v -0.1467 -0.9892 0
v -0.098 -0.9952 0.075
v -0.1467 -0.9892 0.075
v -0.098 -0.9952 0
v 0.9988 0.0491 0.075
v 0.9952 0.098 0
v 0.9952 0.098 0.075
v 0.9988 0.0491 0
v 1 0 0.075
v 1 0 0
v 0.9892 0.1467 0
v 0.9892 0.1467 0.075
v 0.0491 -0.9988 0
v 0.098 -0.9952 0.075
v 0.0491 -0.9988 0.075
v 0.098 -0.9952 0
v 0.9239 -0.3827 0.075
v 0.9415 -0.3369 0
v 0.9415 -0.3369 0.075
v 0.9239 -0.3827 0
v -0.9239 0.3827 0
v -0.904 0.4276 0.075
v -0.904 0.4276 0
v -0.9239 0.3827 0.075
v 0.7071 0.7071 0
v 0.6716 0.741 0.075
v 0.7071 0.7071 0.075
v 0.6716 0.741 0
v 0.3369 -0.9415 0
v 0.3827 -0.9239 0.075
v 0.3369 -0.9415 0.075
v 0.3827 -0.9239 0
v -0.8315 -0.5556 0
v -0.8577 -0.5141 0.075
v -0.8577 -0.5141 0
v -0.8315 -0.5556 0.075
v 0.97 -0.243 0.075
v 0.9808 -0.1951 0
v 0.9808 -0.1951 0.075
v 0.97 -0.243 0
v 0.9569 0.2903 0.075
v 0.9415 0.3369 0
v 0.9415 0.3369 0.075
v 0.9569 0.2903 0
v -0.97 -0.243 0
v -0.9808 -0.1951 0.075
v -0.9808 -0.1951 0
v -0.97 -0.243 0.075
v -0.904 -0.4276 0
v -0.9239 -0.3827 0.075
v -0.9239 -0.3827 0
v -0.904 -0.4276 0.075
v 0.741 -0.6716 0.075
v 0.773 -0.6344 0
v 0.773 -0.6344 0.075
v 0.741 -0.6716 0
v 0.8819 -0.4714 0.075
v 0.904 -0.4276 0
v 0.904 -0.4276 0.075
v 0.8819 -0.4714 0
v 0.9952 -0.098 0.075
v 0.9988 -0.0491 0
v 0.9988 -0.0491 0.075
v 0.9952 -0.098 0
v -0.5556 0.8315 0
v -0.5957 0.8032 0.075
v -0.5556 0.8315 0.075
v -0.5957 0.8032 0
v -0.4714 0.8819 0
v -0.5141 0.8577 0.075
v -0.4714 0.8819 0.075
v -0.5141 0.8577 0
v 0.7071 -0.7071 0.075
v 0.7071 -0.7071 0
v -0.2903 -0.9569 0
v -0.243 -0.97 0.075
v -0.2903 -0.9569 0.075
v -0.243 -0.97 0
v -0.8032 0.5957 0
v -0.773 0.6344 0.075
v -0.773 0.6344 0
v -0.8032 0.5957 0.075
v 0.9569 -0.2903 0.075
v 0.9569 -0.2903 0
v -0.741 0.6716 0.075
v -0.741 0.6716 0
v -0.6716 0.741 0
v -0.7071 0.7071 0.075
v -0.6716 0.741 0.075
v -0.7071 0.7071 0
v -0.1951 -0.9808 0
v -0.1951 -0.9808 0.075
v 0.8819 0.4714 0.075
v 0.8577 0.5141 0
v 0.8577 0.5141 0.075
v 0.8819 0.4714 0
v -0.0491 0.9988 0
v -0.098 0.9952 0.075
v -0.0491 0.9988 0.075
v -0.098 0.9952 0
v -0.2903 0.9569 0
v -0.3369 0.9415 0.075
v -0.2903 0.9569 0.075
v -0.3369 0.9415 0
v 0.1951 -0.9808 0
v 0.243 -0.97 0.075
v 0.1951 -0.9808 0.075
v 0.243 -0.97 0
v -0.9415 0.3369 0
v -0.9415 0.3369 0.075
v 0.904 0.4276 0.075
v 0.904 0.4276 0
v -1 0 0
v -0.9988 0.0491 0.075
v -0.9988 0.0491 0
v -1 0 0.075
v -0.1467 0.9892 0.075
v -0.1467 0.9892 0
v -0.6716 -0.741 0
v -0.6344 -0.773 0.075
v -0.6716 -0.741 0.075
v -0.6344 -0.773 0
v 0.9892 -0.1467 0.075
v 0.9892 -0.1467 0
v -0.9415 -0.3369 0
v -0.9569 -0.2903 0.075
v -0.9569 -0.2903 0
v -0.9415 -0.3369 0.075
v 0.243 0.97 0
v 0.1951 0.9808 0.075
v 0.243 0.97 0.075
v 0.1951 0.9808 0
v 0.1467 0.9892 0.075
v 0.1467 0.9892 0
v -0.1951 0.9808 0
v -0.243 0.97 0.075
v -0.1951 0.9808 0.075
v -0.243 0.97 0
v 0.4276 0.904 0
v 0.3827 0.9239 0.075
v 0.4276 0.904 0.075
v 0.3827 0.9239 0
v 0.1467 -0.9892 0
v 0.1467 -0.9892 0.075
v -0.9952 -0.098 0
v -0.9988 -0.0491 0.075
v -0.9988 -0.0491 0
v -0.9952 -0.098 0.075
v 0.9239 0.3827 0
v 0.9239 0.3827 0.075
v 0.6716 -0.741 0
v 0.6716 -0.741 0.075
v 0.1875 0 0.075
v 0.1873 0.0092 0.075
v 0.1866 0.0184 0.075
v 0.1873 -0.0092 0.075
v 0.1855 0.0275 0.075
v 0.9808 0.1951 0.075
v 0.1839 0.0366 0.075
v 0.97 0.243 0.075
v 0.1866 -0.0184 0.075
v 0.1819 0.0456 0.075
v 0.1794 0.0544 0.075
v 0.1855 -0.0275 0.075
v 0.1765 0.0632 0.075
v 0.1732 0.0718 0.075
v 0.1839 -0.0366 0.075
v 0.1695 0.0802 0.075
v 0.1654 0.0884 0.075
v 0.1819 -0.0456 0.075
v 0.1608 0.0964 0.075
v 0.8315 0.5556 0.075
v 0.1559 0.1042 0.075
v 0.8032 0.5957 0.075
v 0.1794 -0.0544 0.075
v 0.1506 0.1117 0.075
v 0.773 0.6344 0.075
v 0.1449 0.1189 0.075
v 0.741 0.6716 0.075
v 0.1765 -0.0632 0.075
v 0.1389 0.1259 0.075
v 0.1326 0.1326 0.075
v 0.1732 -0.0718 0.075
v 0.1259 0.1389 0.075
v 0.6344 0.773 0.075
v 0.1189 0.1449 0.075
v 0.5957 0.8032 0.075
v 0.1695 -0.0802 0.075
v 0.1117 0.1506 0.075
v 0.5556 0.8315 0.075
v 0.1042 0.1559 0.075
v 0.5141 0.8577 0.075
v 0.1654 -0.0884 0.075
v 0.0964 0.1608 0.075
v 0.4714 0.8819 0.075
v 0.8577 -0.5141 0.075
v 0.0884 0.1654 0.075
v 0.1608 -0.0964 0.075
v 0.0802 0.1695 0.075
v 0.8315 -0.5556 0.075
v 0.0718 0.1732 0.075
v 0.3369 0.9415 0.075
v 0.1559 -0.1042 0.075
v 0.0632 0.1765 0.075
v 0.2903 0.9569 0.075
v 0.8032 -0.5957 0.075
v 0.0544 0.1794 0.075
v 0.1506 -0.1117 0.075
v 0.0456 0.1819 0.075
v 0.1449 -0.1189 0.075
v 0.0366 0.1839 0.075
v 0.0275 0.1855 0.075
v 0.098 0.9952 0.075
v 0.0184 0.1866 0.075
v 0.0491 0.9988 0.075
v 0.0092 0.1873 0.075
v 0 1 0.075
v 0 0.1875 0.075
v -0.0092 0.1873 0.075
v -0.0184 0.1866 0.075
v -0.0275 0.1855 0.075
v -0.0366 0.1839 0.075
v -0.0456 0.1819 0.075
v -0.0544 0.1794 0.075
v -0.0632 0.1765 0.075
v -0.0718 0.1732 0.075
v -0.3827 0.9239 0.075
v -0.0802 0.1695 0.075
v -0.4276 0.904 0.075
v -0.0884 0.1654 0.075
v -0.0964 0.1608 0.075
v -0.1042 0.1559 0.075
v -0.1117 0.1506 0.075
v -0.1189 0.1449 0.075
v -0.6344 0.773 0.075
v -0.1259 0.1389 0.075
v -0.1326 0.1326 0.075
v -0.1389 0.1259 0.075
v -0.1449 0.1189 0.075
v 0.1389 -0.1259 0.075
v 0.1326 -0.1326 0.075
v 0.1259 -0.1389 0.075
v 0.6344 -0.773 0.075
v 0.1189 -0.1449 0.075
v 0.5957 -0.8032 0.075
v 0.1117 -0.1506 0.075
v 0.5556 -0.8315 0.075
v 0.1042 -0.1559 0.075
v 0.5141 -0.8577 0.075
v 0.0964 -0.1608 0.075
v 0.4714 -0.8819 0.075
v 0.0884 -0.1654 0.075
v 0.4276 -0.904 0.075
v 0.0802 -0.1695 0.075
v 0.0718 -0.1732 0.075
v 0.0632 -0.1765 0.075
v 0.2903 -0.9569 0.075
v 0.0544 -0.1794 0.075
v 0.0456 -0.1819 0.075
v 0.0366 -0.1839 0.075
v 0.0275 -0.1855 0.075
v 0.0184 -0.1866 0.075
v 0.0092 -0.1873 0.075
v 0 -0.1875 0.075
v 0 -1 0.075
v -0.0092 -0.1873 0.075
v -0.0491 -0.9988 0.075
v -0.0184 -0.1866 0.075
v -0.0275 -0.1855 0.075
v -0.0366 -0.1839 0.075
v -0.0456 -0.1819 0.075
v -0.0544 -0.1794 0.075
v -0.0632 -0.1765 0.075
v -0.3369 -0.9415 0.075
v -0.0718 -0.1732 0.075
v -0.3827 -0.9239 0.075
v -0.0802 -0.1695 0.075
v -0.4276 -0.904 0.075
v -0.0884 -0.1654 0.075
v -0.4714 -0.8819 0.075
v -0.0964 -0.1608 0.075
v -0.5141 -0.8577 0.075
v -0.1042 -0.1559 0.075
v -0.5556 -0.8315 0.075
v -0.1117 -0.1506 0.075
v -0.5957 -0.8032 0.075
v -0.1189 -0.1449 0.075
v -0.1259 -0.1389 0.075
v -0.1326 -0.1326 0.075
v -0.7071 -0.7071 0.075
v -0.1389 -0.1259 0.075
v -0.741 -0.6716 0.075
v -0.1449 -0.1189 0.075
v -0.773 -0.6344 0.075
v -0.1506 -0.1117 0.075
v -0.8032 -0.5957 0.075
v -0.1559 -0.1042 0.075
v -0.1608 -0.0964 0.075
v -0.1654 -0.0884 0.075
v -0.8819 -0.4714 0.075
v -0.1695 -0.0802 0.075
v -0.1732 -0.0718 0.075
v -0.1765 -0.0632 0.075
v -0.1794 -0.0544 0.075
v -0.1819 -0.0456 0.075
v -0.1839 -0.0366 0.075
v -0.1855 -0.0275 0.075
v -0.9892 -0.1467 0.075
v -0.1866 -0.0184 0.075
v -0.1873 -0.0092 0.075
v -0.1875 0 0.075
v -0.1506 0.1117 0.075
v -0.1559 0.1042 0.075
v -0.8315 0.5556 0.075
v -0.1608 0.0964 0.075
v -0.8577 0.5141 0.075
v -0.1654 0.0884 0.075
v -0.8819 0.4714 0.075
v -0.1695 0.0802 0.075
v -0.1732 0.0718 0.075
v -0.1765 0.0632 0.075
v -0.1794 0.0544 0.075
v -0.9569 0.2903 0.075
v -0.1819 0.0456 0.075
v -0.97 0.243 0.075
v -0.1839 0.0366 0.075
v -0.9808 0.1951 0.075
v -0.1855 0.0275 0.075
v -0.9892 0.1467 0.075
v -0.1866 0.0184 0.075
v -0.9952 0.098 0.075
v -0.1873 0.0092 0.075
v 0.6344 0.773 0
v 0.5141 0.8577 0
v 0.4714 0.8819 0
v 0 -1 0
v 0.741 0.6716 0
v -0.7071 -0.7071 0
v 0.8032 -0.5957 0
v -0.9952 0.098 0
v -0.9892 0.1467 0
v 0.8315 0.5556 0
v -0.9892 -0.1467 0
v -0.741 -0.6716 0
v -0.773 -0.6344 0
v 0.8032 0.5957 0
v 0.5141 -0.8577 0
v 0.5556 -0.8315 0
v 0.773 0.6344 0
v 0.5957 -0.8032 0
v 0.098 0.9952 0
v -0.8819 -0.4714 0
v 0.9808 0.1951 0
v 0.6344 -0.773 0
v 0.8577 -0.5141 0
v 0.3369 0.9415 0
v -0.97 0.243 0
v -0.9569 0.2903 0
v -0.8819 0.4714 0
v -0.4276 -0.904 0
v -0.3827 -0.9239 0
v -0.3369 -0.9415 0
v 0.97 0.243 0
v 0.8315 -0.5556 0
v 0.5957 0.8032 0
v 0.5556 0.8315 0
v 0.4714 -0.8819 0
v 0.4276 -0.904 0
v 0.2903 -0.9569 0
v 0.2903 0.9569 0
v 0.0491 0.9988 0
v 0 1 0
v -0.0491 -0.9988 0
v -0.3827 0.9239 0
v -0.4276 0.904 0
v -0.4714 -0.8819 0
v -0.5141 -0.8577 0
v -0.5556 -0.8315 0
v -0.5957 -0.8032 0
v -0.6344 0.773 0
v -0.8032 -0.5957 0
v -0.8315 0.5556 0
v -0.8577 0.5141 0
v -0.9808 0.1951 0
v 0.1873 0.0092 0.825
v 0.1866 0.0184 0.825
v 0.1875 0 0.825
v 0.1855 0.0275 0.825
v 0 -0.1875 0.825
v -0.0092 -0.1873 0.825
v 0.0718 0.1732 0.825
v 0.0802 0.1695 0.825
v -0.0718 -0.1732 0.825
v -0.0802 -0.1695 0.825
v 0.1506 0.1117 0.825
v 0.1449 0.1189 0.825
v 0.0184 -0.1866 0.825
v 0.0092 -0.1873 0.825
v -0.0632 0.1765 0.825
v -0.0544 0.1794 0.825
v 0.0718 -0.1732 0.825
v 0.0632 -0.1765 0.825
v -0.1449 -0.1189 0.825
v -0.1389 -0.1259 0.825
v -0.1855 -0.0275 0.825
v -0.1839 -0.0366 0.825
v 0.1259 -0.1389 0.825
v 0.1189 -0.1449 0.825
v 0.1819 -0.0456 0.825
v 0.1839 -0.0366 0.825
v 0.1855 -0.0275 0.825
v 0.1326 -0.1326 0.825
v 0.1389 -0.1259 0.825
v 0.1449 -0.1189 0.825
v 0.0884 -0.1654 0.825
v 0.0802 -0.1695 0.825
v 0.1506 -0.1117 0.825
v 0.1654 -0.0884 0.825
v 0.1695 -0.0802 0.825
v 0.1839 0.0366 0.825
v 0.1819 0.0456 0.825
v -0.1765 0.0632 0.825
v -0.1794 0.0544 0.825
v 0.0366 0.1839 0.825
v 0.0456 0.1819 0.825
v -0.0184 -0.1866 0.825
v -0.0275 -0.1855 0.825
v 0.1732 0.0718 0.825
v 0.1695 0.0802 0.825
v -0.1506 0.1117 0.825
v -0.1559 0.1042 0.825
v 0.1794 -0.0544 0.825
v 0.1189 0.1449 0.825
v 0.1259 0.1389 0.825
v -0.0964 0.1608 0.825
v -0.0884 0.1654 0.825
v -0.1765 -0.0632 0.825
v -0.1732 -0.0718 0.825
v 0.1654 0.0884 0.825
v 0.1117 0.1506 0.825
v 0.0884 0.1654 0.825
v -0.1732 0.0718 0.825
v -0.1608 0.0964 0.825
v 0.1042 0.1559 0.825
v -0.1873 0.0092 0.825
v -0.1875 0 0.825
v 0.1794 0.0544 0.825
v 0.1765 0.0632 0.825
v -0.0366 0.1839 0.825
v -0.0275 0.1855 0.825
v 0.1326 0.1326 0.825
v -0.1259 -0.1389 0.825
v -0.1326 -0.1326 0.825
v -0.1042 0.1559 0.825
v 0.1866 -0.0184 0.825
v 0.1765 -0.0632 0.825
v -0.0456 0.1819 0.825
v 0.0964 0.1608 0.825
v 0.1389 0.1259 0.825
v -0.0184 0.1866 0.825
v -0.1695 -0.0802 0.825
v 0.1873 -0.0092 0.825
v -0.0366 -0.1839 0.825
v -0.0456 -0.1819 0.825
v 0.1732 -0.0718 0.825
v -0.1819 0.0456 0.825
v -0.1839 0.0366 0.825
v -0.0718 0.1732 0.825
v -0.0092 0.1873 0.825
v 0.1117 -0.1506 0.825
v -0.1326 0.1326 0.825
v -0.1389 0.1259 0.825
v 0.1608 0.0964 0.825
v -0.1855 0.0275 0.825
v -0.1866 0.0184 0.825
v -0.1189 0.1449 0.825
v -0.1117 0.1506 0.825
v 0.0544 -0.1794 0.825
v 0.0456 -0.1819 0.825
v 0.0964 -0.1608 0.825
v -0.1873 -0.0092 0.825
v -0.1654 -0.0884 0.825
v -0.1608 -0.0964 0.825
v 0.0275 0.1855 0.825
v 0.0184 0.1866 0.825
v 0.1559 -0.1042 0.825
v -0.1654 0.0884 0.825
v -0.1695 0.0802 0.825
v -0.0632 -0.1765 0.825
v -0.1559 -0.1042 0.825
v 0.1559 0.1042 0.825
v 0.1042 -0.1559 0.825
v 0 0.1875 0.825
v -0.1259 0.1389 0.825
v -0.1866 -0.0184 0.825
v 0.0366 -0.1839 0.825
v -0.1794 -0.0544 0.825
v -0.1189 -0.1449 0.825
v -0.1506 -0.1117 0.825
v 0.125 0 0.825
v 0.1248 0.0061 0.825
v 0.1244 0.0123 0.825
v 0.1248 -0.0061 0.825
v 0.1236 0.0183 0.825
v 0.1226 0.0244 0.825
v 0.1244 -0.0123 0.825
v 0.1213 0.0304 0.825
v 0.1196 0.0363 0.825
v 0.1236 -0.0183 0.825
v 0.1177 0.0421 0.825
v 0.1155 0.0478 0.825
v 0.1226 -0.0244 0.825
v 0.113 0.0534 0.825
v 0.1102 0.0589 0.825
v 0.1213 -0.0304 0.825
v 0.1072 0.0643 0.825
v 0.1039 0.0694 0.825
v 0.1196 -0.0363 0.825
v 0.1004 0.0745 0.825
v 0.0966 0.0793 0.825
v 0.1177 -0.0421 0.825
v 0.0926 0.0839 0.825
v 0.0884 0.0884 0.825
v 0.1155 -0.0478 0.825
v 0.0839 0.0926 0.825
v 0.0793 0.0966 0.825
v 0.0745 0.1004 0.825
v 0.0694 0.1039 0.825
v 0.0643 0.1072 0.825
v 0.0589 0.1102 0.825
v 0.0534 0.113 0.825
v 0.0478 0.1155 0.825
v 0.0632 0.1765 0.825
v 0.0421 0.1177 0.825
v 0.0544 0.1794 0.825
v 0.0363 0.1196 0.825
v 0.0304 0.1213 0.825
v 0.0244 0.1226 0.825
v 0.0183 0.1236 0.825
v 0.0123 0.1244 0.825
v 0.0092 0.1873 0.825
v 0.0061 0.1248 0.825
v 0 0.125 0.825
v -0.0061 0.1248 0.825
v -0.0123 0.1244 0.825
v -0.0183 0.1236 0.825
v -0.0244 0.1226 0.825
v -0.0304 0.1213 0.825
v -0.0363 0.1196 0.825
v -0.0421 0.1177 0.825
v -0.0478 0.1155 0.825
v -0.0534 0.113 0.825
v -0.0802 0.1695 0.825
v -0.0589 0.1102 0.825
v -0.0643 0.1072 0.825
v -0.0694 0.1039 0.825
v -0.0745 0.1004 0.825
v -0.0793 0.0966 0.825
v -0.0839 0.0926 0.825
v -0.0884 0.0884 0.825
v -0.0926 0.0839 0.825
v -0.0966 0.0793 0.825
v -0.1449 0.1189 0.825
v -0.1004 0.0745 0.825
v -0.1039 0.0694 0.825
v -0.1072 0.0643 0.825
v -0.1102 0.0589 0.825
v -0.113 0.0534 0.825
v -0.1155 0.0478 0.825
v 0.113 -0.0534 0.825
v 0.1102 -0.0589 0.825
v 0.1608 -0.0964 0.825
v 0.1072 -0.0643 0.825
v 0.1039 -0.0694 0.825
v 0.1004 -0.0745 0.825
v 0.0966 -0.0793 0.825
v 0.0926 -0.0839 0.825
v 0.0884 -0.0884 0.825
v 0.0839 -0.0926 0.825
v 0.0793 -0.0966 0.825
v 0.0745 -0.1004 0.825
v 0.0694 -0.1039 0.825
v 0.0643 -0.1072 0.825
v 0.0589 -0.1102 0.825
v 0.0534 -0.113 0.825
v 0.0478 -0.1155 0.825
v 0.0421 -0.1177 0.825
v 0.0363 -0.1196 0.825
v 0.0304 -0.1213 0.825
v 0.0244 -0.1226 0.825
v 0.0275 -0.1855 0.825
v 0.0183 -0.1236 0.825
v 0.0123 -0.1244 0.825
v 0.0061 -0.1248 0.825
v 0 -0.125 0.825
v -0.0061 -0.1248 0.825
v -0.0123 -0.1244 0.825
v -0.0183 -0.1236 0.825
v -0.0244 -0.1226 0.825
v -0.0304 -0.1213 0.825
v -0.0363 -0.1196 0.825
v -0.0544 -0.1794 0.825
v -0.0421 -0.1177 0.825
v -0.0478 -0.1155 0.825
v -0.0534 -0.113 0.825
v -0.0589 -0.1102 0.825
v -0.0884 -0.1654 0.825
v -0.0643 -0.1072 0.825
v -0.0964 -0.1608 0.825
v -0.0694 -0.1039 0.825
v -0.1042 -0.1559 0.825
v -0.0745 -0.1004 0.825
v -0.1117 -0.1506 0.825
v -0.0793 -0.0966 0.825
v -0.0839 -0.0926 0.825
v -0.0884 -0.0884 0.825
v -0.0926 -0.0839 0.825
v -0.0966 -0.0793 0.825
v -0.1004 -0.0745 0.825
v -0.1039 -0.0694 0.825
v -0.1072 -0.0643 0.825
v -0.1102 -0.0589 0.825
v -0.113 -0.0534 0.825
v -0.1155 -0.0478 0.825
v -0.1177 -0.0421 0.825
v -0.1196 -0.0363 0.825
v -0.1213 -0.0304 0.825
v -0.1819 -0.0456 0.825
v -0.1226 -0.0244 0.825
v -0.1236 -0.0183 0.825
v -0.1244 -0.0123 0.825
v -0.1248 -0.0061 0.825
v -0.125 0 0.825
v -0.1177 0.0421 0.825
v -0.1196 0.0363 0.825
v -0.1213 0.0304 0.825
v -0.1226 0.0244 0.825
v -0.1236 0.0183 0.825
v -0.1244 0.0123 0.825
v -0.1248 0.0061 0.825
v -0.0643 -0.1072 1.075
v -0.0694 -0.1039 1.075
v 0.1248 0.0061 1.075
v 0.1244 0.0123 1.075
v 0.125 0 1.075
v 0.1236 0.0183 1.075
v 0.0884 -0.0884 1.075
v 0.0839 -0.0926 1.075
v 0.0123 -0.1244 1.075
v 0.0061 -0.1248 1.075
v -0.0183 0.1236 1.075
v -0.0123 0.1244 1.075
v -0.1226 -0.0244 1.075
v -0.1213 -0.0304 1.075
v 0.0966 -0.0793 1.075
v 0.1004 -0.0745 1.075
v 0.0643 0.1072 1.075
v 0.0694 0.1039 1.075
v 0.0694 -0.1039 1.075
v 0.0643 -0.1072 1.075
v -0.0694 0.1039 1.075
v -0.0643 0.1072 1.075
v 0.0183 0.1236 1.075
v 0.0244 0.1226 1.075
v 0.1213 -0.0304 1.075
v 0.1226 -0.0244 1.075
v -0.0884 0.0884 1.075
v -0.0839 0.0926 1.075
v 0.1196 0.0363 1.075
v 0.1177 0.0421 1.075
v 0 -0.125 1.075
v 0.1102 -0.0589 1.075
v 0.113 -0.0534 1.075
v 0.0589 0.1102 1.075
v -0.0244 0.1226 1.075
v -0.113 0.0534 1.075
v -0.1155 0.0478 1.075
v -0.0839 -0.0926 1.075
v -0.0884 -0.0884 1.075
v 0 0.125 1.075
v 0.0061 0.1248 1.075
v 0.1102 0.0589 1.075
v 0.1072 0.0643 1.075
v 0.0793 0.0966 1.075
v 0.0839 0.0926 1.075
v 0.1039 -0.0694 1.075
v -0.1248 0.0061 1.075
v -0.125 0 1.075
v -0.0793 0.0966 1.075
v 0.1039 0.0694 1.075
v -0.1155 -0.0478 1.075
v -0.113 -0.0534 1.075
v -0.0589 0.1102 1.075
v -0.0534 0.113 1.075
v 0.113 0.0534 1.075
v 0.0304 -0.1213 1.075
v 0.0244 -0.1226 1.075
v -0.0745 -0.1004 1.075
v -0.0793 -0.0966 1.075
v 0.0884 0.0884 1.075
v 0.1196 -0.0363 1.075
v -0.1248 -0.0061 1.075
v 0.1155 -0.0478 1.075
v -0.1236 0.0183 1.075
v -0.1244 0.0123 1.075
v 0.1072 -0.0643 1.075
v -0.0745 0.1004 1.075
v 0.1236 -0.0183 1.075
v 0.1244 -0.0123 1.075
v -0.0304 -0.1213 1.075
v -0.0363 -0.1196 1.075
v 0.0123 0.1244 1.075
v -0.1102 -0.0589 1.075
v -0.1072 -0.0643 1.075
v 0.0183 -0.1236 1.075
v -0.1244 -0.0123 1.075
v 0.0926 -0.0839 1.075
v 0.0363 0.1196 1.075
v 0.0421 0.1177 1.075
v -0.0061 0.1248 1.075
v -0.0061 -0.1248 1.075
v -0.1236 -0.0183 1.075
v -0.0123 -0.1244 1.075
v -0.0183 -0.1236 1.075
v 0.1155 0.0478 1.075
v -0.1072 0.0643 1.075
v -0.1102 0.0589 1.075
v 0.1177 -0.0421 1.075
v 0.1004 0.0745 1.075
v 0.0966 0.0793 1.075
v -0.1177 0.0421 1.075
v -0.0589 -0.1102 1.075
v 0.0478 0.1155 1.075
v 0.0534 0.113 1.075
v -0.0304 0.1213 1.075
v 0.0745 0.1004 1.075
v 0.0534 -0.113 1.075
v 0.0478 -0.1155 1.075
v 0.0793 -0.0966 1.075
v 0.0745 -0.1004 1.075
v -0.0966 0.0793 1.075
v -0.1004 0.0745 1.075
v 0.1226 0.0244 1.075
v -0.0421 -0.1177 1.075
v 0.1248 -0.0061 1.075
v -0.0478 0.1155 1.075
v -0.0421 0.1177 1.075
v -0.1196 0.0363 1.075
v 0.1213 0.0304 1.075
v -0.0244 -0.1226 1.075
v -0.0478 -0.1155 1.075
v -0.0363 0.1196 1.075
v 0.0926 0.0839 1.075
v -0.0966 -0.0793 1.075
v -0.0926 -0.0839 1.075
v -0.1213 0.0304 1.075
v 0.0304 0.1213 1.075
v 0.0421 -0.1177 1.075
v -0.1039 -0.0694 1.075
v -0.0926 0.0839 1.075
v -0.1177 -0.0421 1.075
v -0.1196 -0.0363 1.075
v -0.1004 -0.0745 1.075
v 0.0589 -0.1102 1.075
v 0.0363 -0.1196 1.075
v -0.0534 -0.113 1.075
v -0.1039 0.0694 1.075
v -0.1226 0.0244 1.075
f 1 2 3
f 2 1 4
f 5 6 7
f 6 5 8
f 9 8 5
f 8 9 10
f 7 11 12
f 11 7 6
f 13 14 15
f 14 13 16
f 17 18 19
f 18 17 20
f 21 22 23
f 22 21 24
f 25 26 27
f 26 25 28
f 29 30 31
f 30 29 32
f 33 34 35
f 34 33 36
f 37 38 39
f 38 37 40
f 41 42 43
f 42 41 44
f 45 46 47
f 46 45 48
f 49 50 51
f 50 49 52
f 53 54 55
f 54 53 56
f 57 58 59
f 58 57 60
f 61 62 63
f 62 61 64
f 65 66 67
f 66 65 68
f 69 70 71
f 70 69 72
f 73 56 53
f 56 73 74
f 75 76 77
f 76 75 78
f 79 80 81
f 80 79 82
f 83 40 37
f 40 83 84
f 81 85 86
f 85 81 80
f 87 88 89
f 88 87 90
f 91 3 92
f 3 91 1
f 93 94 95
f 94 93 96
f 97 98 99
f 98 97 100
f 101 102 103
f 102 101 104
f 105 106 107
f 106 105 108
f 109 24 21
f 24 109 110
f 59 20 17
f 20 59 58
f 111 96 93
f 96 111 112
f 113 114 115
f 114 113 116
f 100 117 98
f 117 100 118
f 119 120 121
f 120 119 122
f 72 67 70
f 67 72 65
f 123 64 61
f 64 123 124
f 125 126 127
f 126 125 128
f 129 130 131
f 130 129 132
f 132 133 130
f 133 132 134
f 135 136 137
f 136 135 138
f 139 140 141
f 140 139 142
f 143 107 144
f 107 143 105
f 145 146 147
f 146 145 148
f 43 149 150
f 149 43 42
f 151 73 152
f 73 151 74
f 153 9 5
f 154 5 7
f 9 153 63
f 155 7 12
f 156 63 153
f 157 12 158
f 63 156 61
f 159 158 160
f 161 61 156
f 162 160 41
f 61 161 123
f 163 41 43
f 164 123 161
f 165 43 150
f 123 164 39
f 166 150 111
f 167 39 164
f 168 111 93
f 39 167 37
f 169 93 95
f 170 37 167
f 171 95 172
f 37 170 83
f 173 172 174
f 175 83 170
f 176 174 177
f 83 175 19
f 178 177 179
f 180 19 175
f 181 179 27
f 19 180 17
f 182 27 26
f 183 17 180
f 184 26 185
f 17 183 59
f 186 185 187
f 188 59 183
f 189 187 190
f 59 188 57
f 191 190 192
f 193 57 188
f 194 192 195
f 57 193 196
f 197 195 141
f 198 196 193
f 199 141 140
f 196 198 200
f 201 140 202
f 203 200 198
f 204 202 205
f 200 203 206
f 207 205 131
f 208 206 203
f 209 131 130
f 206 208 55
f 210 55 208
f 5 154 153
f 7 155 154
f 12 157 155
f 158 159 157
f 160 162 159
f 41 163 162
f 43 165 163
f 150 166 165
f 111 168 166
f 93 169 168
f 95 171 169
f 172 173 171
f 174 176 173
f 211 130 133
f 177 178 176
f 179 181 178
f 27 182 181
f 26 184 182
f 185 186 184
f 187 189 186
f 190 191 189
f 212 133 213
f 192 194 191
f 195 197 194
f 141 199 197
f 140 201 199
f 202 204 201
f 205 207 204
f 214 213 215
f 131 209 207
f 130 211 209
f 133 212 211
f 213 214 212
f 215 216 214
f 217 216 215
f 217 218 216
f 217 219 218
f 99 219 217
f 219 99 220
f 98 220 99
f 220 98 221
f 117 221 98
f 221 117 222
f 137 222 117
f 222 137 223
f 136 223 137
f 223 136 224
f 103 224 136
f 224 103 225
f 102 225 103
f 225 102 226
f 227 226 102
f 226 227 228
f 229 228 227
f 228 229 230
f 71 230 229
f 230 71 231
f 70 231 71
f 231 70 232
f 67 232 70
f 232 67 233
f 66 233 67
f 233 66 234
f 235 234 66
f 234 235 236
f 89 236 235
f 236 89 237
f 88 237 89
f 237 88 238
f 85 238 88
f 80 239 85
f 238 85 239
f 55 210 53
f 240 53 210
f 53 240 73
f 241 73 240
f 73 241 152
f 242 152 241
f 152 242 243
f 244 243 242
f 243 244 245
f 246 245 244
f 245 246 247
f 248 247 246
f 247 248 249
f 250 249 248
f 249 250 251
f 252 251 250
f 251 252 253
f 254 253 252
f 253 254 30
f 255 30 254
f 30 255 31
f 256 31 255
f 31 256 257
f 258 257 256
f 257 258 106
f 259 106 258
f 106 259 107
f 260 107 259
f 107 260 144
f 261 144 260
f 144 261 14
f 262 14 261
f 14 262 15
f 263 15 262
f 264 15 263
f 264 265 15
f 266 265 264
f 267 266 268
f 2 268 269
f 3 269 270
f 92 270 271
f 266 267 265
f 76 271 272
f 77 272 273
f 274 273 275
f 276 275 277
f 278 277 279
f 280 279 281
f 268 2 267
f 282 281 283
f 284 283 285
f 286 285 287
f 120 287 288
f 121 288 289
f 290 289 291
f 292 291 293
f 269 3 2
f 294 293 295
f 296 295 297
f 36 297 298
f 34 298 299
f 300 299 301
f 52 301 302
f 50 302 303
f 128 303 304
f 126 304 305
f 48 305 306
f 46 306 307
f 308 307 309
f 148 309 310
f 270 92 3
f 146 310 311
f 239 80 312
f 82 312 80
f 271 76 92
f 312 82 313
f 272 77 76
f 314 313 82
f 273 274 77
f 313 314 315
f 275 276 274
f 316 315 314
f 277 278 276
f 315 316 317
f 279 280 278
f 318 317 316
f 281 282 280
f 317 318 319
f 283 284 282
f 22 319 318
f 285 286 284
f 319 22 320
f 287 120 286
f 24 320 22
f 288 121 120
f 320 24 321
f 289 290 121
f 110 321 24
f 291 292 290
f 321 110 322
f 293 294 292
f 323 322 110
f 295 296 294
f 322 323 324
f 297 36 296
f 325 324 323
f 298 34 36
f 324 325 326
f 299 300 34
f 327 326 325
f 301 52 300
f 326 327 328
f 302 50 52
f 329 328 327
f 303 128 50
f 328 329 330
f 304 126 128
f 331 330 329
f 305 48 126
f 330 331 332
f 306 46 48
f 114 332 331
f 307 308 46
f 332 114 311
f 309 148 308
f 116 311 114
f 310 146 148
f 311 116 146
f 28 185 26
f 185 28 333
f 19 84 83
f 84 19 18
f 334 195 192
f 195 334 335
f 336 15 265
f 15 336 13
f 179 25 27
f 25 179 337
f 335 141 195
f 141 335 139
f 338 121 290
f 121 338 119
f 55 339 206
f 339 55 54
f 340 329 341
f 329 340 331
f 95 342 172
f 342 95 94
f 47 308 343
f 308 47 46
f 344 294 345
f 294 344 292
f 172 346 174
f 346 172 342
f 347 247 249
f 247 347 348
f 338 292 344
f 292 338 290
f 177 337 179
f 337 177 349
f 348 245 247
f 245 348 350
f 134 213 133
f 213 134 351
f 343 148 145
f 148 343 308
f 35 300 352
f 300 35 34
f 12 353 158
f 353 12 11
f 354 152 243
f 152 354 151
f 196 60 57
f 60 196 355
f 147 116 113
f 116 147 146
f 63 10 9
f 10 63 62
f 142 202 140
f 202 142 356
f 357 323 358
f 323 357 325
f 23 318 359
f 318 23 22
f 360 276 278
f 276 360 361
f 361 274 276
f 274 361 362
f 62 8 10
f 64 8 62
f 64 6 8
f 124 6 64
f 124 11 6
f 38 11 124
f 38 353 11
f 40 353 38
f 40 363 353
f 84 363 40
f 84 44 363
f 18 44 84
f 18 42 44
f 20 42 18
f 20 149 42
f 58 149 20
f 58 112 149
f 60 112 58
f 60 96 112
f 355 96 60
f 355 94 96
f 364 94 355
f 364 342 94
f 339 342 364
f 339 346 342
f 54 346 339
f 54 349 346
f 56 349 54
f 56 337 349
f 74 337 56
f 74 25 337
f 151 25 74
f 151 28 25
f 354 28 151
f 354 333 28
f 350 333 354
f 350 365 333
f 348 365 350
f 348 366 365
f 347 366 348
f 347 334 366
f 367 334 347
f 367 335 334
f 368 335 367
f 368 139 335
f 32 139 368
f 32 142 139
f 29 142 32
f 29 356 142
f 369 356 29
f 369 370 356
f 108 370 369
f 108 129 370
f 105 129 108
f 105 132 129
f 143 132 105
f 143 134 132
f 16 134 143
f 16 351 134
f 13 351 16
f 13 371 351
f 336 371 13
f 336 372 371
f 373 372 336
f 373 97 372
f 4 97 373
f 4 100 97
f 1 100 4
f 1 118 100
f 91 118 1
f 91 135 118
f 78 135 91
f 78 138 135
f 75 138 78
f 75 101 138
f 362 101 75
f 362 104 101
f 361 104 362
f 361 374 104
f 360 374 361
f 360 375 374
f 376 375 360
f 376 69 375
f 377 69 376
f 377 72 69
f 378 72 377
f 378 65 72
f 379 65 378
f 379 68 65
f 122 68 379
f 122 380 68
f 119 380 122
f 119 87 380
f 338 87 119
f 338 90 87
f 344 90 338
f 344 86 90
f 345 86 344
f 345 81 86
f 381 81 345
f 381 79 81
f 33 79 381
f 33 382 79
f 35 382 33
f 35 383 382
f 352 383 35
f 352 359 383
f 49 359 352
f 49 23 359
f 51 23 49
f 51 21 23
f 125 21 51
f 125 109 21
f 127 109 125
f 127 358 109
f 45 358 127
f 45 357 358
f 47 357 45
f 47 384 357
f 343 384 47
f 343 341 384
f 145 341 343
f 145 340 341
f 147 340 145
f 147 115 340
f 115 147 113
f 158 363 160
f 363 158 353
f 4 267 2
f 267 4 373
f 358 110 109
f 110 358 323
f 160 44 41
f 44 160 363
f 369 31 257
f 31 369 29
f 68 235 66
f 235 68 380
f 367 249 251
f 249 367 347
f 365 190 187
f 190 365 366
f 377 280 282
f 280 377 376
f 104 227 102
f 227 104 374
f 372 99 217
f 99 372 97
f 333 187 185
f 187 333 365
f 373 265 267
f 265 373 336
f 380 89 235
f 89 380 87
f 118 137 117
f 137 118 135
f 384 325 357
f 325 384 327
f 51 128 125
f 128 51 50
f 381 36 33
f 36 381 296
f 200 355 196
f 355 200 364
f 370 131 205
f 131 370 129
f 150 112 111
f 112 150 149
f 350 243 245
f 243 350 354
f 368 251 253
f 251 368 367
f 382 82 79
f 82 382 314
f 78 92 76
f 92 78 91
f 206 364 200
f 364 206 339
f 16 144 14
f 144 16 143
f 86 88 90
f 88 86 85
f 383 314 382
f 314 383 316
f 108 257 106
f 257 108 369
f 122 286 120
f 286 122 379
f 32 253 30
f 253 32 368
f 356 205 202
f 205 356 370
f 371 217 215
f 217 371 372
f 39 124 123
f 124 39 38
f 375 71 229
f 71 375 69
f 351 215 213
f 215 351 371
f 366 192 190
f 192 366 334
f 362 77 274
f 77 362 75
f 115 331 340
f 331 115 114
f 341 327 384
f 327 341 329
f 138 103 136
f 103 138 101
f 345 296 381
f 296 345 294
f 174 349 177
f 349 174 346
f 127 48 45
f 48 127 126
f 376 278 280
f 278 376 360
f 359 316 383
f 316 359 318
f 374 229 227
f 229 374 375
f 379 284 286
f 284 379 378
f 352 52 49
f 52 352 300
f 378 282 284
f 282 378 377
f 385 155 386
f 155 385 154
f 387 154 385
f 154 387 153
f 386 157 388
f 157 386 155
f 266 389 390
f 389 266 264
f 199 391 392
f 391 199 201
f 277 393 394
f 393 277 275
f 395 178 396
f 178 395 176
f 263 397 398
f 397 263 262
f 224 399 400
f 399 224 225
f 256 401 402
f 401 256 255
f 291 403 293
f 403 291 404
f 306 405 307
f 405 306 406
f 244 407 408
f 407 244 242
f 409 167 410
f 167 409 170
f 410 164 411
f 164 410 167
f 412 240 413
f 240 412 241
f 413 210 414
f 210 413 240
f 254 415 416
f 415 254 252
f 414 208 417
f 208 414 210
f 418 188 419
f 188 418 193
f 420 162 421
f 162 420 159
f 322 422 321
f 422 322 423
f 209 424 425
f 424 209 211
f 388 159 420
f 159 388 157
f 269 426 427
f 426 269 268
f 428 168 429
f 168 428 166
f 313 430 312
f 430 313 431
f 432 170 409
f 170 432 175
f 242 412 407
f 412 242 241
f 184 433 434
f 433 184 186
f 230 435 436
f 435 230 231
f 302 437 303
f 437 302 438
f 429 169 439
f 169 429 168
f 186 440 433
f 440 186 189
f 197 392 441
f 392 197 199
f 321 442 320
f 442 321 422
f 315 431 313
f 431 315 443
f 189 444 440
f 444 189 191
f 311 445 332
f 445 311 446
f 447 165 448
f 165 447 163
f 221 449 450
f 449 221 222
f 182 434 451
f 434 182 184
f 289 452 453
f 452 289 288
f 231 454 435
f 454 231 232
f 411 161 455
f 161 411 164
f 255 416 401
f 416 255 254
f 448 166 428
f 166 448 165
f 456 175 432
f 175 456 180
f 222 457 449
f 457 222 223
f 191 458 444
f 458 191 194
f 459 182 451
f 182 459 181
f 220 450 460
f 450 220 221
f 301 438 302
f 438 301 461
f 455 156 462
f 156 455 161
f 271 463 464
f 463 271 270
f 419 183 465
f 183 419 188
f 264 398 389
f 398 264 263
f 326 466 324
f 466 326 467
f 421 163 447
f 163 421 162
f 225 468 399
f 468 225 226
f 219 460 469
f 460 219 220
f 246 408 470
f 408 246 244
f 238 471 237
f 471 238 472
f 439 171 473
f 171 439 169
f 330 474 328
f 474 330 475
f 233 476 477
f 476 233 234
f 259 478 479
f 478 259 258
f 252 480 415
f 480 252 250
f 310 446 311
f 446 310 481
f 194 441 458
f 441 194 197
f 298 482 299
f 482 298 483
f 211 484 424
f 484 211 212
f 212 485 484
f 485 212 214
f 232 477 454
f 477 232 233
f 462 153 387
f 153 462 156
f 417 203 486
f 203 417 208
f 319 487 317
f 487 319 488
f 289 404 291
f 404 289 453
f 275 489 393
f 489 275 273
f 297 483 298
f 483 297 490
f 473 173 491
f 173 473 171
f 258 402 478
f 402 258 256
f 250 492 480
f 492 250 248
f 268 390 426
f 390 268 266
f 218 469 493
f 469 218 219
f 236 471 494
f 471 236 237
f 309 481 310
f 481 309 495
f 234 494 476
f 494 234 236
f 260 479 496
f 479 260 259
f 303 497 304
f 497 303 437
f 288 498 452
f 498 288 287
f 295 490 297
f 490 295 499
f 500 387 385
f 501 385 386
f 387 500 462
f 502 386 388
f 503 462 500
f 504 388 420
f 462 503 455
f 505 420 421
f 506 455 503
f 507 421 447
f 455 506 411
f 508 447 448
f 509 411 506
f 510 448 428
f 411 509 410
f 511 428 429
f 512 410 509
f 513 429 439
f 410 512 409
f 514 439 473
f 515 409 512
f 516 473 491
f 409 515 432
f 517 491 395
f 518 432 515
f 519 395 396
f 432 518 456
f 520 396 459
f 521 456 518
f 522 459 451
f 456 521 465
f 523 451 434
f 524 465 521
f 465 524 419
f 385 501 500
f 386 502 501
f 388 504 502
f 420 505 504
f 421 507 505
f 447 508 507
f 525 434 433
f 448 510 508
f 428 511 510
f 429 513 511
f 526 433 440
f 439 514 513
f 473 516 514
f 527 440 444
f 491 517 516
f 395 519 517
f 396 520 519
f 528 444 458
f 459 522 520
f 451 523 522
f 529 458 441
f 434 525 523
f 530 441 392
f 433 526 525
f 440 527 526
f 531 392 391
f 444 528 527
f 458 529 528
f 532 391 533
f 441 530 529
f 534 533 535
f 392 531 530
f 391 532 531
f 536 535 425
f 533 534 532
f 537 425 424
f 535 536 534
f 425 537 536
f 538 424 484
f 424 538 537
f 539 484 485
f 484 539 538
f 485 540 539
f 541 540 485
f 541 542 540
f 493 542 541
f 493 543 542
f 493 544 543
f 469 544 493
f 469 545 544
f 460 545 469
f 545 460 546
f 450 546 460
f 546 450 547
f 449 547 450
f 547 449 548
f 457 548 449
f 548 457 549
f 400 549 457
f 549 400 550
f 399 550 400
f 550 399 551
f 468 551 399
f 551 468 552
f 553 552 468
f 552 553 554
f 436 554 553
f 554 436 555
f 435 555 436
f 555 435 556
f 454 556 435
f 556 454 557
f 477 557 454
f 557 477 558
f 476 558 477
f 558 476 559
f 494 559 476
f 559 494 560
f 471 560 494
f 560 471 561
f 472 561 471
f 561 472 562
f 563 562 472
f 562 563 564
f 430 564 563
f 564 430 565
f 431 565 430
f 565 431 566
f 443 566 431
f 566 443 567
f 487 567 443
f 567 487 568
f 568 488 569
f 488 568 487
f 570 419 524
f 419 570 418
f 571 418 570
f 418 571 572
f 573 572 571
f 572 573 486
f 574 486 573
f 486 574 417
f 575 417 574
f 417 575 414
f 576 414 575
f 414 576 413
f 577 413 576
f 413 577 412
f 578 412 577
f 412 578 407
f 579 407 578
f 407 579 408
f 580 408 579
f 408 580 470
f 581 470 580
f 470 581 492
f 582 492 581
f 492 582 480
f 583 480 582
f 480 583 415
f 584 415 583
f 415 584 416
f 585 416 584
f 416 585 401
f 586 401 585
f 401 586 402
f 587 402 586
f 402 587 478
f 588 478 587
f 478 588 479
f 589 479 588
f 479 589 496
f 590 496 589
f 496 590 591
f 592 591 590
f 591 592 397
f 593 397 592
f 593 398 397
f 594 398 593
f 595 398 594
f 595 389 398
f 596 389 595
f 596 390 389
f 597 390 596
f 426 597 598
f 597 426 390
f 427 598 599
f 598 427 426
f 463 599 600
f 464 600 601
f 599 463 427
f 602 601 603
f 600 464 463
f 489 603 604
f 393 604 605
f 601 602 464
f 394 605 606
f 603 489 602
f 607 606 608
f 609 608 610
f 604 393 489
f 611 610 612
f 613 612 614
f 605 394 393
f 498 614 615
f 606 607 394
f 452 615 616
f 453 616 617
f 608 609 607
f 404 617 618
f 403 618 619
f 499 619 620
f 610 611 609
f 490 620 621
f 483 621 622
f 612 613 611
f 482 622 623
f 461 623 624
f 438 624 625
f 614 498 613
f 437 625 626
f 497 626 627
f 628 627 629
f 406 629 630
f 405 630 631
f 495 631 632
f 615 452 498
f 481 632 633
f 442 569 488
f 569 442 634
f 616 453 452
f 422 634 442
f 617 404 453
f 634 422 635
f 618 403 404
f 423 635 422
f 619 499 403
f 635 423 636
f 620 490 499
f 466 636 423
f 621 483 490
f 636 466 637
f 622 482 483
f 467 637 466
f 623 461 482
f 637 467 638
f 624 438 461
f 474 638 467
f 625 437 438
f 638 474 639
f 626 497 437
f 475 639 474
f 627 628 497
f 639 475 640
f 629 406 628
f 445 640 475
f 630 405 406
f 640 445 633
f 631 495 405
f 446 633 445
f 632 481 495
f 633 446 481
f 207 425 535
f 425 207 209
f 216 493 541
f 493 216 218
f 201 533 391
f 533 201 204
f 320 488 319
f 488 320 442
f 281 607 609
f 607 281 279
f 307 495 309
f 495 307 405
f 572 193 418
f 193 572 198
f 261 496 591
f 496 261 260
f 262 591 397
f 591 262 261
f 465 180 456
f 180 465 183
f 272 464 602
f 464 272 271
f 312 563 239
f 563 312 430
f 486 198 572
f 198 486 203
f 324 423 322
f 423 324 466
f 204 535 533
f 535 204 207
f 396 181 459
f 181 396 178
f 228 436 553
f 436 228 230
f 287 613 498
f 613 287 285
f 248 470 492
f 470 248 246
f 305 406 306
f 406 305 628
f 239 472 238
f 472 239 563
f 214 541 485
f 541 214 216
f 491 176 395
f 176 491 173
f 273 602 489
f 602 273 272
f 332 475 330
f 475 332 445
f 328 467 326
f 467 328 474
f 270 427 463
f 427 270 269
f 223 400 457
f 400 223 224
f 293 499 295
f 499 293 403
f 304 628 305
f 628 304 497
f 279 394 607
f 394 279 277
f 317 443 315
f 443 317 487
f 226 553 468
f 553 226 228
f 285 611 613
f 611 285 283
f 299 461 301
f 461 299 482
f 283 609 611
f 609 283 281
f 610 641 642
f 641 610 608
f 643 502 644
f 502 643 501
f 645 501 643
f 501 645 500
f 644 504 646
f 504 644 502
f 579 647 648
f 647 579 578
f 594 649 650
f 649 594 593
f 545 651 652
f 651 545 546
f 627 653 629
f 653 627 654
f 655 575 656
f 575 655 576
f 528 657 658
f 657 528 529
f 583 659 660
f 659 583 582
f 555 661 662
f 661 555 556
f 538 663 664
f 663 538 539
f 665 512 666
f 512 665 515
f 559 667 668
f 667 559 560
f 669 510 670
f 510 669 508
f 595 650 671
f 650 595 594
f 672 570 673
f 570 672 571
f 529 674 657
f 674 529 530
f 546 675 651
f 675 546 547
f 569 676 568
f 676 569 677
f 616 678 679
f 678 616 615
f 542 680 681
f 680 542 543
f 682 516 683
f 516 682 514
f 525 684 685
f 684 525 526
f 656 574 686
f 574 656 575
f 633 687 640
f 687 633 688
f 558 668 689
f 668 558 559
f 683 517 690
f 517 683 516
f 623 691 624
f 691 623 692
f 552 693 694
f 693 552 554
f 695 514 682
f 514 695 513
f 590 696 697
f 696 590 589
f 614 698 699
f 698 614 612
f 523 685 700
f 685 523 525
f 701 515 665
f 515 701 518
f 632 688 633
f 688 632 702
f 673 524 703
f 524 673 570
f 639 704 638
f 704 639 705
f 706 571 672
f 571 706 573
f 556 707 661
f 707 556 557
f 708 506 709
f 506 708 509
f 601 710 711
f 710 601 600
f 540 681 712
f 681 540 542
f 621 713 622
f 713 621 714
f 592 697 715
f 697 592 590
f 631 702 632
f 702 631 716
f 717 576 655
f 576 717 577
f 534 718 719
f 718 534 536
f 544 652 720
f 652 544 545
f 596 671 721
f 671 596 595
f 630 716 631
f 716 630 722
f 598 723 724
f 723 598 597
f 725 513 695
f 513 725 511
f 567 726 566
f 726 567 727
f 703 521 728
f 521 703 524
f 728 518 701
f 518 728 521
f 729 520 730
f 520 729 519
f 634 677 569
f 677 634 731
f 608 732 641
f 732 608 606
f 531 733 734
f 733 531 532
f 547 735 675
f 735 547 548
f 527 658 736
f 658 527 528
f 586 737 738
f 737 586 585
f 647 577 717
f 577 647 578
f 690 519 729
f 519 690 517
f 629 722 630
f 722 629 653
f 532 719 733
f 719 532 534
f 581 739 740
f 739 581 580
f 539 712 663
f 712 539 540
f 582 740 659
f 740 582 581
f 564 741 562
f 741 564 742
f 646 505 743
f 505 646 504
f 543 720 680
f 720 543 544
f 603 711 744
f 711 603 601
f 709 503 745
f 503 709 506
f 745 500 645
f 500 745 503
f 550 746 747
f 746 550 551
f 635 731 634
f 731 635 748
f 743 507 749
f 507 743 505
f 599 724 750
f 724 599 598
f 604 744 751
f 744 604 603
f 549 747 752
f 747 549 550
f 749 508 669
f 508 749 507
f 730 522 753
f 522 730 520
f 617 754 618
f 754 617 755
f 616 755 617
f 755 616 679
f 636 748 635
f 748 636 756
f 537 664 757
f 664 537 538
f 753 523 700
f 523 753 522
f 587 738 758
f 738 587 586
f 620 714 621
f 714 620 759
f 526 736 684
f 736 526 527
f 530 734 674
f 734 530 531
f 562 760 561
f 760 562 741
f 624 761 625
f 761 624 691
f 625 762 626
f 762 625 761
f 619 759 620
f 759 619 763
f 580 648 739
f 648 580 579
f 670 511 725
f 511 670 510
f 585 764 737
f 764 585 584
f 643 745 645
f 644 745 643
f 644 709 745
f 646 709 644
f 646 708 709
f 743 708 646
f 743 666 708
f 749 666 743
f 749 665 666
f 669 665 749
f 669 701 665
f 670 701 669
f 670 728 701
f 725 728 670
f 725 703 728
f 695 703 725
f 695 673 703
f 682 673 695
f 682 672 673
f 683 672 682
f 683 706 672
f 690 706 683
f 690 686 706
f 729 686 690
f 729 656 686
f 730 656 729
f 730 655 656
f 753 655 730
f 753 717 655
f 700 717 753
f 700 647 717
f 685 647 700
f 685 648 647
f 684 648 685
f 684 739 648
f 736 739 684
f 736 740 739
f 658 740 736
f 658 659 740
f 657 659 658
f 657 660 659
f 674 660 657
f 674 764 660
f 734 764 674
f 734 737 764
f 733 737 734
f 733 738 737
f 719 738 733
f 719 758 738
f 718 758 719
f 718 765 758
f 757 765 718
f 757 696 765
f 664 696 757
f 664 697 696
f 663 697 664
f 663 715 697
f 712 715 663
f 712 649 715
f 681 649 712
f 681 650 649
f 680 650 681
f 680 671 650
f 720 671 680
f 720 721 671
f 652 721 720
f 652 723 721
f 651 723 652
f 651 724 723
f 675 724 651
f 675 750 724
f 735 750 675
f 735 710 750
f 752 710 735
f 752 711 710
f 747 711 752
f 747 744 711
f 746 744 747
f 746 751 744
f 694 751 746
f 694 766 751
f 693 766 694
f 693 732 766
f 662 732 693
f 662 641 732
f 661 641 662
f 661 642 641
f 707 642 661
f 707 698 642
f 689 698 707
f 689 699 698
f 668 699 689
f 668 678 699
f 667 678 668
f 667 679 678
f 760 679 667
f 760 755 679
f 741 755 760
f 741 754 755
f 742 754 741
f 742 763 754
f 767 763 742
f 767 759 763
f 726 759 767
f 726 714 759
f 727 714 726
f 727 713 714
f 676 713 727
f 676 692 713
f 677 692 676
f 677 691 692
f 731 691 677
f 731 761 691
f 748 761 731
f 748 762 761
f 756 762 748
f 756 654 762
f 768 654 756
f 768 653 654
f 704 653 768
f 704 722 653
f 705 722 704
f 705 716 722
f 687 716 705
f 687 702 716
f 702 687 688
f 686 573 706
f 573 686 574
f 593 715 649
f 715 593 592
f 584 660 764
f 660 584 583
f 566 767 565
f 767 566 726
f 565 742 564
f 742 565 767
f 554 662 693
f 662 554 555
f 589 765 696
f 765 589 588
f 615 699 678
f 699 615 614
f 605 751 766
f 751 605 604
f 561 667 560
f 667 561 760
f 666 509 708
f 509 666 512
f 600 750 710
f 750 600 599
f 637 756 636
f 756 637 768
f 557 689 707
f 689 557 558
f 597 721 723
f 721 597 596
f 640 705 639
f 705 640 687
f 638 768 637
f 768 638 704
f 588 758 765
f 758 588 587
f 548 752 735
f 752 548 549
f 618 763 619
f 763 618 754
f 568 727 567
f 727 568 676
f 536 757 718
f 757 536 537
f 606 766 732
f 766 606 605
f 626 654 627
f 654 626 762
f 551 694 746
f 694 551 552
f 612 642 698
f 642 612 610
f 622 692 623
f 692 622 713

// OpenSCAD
// file: common.scad
flange_dia = 2;
shaft_dia = 0.375;
tenon_dia = shaft_dia - 0.125;

flange_thickness = 0.075;
shaft_length = 1.5;
tenon_length = 0.25;

mortoise_slop = 0.003;

followthrough = 0.01;

module spool_half(flange_dia, shaft_dia, flange_thickness, shaft_length)
{
	union()
	{
		cylinder(d = flange_dia, h = flange_thickness);
		cylinder(d = shaft_dia, h = flange_thickness + shaft_length);
	}
}
// main file
include <common.scad>

$fn = 128;

module spool_top(
	flange_dia = flange_dia,
	shaft_dia = shaft_dia,
	flange_thickness = flange_thickness,
	shaft_length = shaft_length / 2,
	tenon_dia = tenon_dia,
	tenon_length = tenon_length
)
{
	union()
	{
		spool_half(flange_dia, shaft_dia, flange_thickness, shaft_length);
		cylinder(d = tenon_dia, h = flange_thickness + shaft_length + tenon_length);
	}
}

spool_top();
